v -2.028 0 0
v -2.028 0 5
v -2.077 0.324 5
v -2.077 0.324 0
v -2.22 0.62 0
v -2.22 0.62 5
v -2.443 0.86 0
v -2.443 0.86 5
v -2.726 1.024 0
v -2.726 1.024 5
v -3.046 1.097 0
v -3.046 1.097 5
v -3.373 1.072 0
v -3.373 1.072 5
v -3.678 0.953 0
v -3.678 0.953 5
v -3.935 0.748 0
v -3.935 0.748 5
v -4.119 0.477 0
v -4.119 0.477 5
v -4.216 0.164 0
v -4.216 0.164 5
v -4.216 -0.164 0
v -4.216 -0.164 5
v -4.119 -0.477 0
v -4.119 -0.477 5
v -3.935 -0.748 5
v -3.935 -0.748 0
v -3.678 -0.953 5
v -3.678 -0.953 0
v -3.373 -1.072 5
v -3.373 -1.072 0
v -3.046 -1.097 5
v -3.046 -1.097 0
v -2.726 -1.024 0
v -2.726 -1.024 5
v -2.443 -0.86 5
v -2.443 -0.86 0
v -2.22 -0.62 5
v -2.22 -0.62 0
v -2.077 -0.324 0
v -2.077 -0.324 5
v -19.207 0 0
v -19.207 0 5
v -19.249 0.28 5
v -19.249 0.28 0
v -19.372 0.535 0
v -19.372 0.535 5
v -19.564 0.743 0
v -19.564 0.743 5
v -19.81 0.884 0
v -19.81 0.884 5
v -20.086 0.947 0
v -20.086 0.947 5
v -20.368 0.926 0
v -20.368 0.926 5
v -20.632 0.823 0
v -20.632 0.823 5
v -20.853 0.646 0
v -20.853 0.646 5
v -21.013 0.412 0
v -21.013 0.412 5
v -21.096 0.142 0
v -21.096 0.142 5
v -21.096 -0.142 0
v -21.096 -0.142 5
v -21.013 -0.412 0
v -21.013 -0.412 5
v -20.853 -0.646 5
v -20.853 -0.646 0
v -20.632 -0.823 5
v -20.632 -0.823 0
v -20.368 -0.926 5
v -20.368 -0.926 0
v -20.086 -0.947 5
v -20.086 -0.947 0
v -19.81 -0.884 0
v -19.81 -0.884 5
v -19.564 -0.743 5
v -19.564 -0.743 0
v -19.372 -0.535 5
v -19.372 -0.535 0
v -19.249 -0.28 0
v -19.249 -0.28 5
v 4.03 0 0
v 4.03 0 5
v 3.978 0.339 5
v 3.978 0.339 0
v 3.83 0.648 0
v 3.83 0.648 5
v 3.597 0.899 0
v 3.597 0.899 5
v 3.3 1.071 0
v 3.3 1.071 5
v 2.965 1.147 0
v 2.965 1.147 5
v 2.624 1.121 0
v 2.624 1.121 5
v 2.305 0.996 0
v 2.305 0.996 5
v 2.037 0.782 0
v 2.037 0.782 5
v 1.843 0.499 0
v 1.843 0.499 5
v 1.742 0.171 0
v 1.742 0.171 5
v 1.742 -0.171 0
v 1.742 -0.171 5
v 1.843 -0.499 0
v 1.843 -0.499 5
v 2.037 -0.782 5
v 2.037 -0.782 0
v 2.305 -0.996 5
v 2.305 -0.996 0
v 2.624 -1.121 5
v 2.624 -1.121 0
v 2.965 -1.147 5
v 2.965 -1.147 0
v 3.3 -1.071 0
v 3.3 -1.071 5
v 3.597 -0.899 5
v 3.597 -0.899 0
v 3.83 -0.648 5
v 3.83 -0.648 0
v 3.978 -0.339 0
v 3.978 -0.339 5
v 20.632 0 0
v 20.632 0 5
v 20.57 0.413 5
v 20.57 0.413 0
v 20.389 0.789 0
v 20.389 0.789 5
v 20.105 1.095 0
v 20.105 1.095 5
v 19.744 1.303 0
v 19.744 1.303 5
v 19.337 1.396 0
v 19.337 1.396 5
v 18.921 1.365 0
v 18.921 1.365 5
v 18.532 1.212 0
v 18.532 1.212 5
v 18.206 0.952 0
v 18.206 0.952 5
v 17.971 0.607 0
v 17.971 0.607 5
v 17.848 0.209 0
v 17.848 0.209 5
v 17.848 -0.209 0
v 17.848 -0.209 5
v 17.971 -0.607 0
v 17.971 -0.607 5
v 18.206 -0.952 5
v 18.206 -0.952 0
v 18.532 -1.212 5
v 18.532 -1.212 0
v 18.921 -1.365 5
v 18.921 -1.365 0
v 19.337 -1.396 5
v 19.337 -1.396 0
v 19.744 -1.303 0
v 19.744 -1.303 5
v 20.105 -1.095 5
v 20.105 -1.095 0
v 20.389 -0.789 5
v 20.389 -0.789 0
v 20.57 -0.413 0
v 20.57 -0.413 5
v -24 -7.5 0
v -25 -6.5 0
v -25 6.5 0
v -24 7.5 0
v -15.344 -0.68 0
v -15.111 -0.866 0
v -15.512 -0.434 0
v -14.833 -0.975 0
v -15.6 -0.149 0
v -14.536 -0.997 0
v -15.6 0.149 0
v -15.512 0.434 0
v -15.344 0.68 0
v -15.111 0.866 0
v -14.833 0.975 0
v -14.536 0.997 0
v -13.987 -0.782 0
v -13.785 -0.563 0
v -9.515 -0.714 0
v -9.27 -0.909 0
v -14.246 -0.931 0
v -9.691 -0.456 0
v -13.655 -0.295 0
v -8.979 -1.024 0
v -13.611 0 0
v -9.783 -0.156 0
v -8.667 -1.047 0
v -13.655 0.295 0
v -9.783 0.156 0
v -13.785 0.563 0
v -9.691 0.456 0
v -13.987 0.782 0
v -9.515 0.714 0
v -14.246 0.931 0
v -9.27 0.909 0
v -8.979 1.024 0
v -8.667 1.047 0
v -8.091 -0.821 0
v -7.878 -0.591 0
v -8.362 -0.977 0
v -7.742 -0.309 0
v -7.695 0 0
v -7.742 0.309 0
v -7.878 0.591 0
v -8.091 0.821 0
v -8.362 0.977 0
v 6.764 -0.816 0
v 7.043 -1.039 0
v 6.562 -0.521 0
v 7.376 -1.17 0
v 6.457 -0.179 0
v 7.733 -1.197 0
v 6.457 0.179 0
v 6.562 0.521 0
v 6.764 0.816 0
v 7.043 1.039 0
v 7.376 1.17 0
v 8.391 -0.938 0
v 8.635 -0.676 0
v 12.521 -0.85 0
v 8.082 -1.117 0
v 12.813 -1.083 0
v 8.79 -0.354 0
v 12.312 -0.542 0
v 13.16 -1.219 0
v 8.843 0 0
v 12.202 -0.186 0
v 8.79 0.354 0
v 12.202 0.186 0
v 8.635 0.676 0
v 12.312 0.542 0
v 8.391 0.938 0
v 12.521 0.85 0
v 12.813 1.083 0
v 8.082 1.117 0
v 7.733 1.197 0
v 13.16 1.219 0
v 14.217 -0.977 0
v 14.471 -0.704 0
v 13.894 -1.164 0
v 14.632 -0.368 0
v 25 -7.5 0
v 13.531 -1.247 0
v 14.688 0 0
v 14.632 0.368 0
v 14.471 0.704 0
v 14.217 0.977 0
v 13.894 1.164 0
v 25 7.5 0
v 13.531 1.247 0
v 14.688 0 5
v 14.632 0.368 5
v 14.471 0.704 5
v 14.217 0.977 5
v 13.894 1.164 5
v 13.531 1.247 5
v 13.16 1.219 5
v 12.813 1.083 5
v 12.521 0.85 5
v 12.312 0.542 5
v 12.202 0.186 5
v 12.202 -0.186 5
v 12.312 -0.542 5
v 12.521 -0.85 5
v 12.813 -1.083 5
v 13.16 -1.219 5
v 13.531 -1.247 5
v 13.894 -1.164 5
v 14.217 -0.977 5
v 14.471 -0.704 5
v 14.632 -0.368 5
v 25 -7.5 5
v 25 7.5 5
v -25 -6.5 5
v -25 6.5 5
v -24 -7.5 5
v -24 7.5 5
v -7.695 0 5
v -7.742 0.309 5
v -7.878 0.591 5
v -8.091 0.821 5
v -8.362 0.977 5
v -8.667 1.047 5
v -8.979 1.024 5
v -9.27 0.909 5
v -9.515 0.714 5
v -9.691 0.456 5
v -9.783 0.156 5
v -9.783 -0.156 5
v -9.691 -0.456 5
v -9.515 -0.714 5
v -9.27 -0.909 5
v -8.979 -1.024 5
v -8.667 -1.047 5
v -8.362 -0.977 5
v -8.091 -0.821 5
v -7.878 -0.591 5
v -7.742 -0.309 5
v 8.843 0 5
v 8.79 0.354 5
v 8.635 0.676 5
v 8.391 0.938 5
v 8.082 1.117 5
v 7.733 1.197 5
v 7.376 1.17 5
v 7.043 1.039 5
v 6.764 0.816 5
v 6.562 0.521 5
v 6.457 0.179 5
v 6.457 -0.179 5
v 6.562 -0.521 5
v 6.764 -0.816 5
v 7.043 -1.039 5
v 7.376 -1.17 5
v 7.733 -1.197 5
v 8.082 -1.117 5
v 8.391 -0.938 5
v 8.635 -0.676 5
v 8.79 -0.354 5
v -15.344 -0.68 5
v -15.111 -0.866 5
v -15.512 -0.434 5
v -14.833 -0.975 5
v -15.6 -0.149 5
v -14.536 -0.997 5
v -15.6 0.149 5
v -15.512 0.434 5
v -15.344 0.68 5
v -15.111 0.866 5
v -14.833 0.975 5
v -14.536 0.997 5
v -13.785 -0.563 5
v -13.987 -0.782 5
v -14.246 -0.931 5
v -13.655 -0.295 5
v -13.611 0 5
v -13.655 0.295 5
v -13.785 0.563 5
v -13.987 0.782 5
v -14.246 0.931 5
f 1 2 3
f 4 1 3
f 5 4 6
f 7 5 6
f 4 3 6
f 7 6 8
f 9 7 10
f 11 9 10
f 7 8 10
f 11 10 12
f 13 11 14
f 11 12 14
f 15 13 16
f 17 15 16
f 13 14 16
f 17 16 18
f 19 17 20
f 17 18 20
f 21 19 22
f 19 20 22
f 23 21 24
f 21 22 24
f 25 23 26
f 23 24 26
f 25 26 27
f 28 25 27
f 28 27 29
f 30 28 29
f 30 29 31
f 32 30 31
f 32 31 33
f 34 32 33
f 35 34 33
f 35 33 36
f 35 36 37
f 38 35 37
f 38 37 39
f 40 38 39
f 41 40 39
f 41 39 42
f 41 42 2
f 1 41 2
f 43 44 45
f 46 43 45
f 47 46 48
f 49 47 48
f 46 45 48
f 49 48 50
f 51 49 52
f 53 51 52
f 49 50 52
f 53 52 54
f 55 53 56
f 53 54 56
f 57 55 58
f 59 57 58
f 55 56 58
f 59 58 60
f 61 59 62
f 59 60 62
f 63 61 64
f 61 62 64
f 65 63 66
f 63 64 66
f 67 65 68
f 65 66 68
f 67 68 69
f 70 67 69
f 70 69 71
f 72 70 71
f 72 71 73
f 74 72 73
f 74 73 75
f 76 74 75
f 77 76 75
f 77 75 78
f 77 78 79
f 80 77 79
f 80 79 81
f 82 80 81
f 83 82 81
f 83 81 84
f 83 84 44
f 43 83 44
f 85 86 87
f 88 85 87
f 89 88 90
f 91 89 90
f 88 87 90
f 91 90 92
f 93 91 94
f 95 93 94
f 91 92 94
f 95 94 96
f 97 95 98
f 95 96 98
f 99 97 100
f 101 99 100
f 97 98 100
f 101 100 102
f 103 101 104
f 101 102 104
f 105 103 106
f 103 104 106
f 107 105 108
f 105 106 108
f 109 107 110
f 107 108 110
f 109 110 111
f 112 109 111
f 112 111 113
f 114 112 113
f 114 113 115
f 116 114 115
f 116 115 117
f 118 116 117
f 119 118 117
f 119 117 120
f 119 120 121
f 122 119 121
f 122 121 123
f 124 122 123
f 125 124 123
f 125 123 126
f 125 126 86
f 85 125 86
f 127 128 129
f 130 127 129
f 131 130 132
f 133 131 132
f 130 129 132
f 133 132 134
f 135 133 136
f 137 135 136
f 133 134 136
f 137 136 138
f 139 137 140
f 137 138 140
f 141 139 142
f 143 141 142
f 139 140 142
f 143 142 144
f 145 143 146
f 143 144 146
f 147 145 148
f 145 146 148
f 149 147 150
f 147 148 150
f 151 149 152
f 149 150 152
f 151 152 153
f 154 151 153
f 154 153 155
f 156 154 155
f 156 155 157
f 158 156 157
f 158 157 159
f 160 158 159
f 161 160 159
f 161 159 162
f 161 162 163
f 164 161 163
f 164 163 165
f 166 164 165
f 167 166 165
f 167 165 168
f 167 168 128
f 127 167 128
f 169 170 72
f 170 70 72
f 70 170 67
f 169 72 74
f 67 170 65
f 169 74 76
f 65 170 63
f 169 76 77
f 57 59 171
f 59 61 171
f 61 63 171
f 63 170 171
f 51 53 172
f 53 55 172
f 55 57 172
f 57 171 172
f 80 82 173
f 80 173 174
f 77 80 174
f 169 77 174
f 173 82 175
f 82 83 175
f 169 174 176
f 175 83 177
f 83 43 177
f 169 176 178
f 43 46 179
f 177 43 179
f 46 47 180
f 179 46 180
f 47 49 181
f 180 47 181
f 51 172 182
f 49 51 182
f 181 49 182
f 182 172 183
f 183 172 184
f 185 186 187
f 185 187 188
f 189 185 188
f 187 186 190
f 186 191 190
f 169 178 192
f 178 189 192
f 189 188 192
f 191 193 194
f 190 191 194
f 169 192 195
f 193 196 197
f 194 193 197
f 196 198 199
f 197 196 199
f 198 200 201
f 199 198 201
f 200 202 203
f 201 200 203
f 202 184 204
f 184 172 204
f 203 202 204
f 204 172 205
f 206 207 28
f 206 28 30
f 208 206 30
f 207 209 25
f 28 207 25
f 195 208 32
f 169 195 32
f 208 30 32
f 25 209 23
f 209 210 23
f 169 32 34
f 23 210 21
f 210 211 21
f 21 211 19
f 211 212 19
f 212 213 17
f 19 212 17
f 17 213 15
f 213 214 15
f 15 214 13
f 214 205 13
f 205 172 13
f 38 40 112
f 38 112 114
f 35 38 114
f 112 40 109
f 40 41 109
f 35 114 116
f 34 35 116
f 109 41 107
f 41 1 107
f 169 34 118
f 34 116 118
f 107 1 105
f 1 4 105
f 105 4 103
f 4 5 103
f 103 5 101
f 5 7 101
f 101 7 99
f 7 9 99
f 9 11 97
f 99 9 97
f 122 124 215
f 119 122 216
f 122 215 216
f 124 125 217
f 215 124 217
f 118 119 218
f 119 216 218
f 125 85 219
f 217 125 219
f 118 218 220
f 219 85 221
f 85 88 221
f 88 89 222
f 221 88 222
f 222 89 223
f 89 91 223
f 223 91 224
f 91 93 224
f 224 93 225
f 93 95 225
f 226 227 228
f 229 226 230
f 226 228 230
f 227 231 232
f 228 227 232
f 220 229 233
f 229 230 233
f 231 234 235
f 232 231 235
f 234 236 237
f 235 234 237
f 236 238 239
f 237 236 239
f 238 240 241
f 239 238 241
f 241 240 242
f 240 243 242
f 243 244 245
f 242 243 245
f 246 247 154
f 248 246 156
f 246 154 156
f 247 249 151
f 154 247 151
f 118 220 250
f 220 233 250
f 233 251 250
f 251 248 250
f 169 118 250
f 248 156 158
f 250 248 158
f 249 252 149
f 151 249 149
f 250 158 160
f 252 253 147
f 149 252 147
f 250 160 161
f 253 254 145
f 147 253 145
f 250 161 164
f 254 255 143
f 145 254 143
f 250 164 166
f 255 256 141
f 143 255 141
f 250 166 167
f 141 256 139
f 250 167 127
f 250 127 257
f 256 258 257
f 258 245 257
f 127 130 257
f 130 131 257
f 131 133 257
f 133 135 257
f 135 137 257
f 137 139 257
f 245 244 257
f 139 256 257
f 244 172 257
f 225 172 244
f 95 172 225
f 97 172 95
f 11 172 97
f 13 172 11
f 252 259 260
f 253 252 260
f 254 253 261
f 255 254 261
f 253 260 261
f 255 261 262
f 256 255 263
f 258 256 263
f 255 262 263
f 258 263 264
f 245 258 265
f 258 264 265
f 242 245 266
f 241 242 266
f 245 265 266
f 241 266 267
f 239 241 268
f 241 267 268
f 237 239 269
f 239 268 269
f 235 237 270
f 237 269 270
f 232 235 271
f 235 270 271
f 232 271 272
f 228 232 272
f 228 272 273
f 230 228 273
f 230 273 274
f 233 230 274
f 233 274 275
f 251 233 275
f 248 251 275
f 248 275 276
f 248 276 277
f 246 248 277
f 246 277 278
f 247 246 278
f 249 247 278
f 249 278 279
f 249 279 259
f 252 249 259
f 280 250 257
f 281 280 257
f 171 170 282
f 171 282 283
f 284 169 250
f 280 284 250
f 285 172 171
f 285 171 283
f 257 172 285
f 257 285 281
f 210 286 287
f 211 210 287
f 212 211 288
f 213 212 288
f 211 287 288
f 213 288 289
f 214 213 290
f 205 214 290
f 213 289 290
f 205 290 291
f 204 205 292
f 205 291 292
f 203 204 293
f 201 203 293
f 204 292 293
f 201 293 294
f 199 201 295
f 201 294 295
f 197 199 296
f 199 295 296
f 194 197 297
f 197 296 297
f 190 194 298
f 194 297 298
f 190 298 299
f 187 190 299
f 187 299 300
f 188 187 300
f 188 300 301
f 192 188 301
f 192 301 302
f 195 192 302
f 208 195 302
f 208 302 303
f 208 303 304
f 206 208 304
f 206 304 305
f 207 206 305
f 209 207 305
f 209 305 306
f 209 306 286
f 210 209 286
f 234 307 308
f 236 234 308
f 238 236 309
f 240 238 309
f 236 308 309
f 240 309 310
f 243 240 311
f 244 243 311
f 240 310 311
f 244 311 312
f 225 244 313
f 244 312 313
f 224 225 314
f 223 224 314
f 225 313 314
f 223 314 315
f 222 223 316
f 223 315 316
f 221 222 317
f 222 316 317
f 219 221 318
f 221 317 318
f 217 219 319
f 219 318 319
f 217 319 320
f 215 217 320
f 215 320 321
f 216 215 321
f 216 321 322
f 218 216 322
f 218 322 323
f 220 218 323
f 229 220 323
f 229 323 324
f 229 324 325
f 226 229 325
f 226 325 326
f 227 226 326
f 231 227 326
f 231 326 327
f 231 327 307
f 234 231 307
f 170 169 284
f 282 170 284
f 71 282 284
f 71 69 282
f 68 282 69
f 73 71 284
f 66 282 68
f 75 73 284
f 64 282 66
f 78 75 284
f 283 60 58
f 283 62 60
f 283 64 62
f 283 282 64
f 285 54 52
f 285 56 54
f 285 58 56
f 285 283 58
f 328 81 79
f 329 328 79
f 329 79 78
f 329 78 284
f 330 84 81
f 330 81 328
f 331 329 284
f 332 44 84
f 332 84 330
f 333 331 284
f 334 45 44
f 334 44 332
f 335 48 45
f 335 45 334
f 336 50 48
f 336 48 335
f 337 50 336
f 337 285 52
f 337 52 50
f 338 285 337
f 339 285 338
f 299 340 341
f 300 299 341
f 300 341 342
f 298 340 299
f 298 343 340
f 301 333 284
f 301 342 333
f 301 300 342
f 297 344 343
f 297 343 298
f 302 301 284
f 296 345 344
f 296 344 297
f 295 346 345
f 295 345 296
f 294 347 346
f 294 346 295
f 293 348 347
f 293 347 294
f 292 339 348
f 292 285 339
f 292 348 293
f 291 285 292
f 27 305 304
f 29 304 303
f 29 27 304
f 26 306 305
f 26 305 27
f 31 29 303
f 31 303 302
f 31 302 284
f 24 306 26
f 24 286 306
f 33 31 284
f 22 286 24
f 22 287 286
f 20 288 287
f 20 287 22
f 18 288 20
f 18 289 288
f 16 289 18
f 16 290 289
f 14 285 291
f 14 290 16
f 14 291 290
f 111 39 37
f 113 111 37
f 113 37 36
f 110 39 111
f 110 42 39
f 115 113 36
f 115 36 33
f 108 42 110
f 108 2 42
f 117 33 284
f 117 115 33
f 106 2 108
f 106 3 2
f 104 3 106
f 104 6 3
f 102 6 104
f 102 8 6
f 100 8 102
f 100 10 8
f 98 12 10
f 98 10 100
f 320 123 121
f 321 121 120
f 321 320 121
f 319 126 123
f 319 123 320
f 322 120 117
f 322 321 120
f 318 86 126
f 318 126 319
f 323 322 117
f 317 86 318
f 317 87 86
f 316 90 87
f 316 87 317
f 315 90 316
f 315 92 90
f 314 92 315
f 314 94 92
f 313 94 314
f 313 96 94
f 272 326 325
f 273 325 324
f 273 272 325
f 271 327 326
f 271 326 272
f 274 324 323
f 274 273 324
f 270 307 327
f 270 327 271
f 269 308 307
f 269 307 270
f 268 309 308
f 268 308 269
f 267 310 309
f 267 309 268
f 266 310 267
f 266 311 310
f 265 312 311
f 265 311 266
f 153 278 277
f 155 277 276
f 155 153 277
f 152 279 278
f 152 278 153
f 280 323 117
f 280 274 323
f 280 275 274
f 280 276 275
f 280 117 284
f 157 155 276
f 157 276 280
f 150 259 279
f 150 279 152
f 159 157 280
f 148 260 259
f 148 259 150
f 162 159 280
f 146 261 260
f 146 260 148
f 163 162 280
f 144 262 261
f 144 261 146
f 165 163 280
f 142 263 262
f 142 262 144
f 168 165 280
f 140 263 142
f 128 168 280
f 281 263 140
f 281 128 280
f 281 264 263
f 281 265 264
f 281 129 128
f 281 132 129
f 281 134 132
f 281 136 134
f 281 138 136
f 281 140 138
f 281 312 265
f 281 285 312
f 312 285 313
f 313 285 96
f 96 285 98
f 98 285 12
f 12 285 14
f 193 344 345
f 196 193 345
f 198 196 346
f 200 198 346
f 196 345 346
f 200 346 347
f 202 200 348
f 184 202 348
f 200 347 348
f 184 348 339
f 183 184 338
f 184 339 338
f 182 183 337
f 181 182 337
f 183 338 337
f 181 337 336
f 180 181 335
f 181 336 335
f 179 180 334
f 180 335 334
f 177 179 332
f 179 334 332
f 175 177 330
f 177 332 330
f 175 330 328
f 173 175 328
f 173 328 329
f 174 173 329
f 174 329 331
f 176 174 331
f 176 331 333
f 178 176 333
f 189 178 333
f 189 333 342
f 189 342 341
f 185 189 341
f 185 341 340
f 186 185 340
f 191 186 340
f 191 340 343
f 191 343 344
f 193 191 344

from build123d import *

# Parameters (mm, degrees)
SKETCH1_W           = 50
SKETCH1_H           = 15
BOSS_EXTRUDE1_DEPTH = 5
SKETCH2_R           = 0.95
SKETCH2_R_2         = 1
SKETCH2_R_3         = 1.05
SKETCH2_R_4         = 1.1
SKETCH2_R_5         = 1.15
SKETCH2_R_6         = 1.2
SKETCH2_R_7         = 1.25
SKETCH2_R_8         = 1.4
CUT_EXTRUDE1_DEPTH  = 6
CHAMFER1_SIZE       = 1


with BuildPart() as part:
    # Sketch1 → Boss-Extrude1 (new body)
    with BuildSketch(Plane.XY):
        Rectangle(SKETCH1_W, SKETCH1_H)
    extrude(amount=BOSS_EXTRUDE1_DEPTH)

    # Sketch2 → Cut-Extrude1 (cut, through all)
    with BuildSketch(Plane.XY.offset(5)):
        with Locations((-20.156657813, 0)):
            Circle(SKETCH2_R)
        with Locations((-14.61091069, 0)):
            Circle(SKETCH2_R_2)
        with Locations((-8.745216617, 0)):
            Circle(SKETCH2_R_3)
        with Locations((-3.128370172, 0)):
            Circle(SKETCH2_R_4)
        with Locations((2.879522545, 0)):
            Circle(SKETCH2_R_5)
        with Locations((7.643177125, 0)):
            Circle(SKETCH2_R_6)
        with Locations((13.437771876, 0)):
            Circle(SKETCH2_R_7)
        with Locations((19.232366626, 0)):
            Circle(SKETCH2_R_8)
    extrude(amount=-CUT_EXTRUDE1_DEPTH, mode=Mode.SUBTRACT)

    # Chamfer1
    chamfer1_edges = [part.edges().sort_by_distance(p)[0] for p in [
        (-25, -7.5, 2.5),
        (-25, 7.5, 2.5),
    ]]
    chamfer(chamfer1_edges, length=CHAMFER1_SIZE)


solid = part.part
